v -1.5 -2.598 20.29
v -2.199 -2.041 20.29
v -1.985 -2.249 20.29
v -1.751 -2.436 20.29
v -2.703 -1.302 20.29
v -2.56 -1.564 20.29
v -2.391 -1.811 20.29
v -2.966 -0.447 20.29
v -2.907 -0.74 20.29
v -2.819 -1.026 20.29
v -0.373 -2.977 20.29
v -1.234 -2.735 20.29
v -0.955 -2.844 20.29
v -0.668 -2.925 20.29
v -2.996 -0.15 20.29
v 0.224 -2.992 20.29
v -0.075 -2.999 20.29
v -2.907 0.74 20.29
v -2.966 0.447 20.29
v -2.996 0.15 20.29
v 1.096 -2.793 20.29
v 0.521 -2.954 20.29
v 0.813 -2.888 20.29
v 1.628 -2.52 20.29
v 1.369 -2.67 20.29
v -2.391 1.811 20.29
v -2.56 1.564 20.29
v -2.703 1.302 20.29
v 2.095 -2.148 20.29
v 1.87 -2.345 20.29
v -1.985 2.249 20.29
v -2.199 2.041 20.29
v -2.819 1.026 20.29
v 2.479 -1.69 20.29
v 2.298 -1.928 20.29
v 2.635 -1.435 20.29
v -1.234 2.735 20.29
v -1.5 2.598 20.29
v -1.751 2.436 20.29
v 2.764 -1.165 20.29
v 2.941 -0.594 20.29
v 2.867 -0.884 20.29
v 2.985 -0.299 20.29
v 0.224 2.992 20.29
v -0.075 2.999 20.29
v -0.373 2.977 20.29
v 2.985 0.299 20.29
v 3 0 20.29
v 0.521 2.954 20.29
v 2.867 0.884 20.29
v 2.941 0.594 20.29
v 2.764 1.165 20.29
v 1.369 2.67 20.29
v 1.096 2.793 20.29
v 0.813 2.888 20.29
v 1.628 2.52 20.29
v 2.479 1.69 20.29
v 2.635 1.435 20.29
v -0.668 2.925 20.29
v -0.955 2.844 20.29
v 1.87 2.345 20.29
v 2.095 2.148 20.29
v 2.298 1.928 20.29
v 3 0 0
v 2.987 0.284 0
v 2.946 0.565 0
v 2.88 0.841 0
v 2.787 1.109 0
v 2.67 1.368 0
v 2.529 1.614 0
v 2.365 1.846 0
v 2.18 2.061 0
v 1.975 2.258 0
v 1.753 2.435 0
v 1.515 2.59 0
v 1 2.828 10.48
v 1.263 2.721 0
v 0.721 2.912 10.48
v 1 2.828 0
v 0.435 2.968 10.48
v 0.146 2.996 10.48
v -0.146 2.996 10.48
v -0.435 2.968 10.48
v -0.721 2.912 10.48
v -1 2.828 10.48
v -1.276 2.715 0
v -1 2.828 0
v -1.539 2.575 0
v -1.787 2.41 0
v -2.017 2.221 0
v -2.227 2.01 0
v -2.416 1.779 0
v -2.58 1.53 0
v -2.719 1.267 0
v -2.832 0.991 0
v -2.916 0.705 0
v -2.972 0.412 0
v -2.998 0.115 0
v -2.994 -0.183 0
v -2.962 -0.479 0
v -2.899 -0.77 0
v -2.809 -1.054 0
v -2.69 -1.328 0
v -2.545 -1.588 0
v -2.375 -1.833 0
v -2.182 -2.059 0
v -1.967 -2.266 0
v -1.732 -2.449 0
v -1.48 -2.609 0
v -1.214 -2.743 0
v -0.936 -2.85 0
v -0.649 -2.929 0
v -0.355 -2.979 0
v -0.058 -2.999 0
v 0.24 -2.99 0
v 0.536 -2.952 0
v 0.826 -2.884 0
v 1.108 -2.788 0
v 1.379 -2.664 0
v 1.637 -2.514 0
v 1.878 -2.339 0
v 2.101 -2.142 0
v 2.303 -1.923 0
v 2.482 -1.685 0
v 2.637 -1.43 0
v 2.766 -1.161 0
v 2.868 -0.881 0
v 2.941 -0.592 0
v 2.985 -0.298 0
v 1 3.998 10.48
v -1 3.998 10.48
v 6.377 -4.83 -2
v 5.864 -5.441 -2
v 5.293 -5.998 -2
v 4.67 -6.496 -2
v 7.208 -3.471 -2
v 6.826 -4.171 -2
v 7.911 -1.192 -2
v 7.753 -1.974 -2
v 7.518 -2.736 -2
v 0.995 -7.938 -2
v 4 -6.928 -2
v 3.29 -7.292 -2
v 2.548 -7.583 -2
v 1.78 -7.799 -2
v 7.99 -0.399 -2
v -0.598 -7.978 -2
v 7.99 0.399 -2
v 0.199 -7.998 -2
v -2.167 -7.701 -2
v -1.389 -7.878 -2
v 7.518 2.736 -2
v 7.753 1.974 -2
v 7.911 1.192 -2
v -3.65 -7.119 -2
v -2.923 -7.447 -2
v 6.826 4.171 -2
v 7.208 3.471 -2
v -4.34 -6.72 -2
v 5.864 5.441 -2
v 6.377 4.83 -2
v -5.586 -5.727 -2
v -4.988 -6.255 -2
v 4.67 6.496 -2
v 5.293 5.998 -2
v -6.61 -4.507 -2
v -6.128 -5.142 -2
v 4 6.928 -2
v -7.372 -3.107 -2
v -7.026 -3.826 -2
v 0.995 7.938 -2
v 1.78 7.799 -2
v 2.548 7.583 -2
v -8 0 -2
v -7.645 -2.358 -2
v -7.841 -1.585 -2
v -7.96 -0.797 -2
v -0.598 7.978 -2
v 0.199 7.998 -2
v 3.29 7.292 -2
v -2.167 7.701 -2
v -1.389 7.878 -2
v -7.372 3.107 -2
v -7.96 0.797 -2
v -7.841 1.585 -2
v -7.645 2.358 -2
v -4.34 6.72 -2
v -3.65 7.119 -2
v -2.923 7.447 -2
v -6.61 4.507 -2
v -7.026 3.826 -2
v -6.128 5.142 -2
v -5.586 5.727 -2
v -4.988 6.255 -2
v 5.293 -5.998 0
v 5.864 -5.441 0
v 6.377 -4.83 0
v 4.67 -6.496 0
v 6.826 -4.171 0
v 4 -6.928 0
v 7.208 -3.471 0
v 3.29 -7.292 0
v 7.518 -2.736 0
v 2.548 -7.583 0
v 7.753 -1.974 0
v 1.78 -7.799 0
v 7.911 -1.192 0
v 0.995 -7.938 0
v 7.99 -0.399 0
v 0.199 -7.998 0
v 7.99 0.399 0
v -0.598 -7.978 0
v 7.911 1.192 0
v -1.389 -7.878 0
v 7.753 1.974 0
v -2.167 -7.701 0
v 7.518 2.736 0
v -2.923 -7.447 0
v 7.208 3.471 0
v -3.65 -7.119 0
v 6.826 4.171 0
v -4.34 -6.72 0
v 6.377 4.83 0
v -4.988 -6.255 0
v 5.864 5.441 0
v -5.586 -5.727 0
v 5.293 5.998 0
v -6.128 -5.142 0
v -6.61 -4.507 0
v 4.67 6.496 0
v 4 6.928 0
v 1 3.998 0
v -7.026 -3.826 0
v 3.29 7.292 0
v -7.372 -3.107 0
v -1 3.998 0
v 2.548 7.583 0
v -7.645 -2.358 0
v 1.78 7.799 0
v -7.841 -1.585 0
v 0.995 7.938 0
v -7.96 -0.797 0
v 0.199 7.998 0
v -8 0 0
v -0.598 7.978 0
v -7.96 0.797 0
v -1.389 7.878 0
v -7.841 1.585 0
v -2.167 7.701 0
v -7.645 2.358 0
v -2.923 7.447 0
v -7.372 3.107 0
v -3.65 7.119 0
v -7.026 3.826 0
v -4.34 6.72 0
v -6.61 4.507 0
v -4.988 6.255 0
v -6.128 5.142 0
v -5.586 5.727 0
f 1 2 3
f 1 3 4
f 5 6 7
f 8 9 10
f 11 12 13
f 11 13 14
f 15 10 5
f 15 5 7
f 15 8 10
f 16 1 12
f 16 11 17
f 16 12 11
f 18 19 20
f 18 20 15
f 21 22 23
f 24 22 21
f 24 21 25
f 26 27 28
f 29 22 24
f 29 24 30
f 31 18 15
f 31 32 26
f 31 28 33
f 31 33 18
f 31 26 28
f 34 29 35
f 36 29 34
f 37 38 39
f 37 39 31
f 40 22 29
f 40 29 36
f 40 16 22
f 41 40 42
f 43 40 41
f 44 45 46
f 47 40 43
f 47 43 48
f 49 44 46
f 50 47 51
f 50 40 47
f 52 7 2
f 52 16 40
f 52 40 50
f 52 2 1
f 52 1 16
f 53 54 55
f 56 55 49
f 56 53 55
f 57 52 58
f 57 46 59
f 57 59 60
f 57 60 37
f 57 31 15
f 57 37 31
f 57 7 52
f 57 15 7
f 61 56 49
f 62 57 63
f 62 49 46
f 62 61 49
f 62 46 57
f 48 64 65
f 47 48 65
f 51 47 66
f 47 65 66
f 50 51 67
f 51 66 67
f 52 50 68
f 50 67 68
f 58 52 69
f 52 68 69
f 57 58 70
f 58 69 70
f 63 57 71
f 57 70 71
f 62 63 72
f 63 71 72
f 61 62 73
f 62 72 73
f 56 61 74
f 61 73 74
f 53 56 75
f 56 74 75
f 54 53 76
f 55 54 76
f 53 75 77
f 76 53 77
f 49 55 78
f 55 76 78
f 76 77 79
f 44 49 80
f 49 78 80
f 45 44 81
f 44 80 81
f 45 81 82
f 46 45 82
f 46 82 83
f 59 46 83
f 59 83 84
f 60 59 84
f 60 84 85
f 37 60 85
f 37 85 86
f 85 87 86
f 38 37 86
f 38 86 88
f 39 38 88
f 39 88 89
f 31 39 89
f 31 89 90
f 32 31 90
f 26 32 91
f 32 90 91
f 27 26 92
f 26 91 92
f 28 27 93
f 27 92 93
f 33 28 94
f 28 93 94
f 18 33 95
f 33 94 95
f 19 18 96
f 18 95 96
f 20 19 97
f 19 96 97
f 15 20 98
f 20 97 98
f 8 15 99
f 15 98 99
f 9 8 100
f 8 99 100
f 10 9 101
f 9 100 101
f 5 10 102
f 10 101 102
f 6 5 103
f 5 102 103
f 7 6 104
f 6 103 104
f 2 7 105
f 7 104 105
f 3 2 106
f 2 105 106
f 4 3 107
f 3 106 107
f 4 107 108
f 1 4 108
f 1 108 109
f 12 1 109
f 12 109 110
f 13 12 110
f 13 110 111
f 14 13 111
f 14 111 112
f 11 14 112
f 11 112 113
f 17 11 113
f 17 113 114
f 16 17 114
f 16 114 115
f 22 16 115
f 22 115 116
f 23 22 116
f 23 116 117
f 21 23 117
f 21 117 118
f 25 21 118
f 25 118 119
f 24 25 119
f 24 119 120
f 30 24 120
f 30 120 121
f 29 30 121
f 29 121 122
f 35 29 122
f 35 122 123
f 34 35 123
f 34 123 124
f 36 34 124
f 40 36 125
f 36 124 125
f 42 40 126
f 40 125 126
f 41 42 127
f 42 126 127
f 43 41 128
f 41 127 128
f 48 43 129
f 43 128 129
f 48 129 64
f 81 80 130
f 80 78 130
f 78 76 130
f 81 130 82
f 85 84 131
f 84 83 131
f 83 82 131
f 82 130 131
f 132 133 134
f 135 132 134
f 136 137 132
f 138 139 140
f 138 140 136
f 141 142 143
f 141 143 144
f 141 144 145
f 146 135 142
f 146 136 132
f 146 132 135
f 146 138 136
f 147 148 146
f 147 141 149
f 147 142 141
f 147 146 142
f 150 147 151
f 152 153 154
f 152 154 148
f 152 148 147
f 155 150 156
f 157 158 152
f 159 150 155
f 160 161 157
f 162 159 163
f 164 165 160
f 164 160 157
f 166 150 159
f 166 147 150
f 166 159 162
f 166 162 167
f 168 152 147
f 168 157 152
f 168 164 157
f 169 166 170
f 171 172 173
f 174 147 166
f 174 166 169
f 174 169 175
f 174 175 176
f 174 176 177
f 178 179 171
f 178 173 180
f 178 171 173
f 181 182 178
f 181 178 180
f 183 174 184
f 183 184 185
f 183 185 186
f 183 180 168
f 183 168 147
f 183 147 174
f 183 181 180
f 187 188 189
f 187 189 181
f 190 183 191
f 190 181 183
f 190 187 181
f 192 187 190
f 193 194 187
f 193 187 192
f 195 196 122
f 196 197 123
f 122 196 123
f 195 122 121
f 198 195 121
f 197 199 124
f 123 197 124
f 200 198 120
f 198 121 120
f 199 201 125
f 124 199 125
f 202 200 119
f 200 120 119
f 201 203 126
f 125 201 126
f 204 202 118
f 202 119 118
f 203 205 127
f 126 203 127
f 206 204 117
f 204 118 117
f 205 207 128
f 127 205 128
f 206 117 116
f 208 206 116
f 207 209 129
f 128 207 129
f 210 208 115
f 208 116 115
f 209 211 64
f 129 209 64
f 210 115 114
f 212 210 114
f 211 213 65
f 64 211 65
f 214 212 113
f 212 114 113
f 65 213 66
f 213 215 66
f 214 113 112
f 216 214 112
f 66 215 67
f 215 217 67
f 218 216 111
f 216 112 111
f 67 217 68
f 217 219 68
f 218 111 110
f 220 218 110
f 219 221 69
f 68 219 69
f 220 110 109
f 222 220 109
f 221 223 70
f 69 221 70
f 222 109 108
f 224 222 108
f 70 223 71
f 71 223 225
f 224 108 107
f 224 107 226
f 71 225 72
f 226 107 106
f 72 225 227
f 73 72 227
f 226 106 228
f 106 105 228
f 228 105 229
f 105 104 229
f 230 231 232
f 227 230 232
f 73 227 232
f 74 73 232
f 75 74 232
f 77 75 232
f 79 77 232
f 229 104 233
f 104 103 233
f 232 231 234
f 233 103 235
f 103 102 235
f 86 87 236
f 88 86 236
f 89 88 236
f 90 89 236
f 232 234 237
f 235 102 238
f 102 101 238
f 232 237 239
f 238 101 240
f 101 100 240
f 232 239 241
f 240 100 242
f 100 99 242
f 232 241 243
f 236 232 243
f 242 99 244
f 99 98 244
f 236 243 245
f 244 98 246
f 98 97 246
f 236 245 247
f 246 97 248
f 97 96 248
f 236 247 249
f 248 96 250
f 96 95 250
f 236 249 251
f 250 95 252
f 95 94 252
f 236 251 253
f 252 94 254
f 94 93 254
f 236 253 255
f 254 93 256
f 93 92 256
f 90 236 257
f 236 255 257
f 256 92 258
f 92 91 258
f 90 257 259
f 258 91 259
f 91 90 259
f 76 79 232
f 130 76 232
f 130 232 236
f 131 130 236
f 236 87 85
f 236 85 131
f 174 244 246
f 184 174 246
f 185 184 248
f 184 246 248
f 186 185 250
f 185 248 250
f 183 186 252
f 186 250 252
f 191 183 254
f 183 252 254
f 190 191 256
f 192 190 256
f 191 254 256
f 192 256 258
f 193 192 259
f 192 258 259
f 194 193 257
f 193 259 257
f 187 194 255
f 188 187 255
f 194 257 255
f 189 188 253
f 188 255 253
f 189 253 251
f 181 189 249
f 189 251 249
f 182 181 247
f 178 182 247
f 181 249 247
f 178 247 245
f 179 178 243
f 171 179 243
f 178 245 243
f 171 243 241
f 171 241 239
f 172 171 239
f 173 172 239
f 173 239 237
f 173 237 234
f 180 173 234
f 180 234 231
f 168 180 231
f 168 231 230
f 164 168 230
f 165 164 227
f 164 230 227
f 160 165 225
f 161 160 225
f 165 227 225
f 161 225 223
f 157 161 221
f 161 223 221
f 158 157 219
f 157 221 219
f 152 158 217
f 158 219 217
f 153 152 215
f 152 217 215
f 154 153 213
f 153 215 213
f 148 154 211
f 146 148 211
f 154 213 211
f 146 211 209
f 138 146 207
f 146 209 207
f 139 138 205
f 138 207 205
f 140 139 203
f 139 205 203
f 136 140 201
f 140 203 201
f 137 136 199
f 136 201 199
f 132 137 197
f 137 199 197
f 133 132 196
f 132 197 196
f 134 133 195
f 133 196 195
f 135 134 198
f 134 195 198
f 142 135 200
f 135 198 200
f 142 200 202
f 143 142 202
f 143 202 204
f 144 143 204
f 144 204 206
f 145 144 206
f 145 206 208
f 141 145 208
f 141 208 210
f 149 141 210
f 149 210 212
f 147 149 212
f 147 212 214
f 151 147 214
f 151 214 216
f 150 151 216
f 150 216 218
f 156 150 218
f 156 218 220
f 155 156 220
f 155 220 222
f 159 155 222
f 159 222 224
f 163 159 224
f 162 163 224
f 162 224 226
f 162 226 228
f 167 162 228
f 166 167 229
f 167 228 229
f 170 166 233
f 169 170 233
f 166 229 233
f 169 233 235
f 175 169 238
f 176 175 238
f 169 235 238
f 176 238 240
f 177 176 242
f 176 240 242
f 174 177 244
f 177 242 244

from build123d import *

# Parameters (mm, degrees)
SKETCH1_R           = 3
BOSS_EXTRUDE1_DEPTH = 20.29
SKETCH2_W           = 2
SKETCH2_H           = 1.17
BOSS_EXTRUDE2_DEPTH = 10.48
SKETCH3_R           = 8
BOSS_EXTRUDE3_DEPTH = 2


with BuildPart() as part:
    # Sketch1 → Boss-Extrude1 (new body)
    with BuildSketch(Plane.XY):
        Circle(SKETCH1_R)
    extrude(amount=BOSS_EXTRUDE1_DEPTH)

    # Sketch2 → Boss-Extrude2 (add)
    with BuildSketch(Plane(origin=(0, 0, 0), x_dir=(-1, 0, 0), z_dir=(0, 0, -1))):
        with Locations((0, 3.413427125)):
            Rectangle(SKETCH2_W, SKETCH2_H)
    extrude(amount=-BOSS_EXTRUDE2_DEPTH)

    # Sketch3 → Boss-Extrude3 (add)
    with BuildSketch(Plane(origin=(0, 0, 0), x_dir=(-1, 0, 0), z_dir=(0, 0, -1))):
        Circle(SKETCH3_R)
    extrude(amount=BOSS_EXTRUDE3_DEPTH)


solid = part.part
